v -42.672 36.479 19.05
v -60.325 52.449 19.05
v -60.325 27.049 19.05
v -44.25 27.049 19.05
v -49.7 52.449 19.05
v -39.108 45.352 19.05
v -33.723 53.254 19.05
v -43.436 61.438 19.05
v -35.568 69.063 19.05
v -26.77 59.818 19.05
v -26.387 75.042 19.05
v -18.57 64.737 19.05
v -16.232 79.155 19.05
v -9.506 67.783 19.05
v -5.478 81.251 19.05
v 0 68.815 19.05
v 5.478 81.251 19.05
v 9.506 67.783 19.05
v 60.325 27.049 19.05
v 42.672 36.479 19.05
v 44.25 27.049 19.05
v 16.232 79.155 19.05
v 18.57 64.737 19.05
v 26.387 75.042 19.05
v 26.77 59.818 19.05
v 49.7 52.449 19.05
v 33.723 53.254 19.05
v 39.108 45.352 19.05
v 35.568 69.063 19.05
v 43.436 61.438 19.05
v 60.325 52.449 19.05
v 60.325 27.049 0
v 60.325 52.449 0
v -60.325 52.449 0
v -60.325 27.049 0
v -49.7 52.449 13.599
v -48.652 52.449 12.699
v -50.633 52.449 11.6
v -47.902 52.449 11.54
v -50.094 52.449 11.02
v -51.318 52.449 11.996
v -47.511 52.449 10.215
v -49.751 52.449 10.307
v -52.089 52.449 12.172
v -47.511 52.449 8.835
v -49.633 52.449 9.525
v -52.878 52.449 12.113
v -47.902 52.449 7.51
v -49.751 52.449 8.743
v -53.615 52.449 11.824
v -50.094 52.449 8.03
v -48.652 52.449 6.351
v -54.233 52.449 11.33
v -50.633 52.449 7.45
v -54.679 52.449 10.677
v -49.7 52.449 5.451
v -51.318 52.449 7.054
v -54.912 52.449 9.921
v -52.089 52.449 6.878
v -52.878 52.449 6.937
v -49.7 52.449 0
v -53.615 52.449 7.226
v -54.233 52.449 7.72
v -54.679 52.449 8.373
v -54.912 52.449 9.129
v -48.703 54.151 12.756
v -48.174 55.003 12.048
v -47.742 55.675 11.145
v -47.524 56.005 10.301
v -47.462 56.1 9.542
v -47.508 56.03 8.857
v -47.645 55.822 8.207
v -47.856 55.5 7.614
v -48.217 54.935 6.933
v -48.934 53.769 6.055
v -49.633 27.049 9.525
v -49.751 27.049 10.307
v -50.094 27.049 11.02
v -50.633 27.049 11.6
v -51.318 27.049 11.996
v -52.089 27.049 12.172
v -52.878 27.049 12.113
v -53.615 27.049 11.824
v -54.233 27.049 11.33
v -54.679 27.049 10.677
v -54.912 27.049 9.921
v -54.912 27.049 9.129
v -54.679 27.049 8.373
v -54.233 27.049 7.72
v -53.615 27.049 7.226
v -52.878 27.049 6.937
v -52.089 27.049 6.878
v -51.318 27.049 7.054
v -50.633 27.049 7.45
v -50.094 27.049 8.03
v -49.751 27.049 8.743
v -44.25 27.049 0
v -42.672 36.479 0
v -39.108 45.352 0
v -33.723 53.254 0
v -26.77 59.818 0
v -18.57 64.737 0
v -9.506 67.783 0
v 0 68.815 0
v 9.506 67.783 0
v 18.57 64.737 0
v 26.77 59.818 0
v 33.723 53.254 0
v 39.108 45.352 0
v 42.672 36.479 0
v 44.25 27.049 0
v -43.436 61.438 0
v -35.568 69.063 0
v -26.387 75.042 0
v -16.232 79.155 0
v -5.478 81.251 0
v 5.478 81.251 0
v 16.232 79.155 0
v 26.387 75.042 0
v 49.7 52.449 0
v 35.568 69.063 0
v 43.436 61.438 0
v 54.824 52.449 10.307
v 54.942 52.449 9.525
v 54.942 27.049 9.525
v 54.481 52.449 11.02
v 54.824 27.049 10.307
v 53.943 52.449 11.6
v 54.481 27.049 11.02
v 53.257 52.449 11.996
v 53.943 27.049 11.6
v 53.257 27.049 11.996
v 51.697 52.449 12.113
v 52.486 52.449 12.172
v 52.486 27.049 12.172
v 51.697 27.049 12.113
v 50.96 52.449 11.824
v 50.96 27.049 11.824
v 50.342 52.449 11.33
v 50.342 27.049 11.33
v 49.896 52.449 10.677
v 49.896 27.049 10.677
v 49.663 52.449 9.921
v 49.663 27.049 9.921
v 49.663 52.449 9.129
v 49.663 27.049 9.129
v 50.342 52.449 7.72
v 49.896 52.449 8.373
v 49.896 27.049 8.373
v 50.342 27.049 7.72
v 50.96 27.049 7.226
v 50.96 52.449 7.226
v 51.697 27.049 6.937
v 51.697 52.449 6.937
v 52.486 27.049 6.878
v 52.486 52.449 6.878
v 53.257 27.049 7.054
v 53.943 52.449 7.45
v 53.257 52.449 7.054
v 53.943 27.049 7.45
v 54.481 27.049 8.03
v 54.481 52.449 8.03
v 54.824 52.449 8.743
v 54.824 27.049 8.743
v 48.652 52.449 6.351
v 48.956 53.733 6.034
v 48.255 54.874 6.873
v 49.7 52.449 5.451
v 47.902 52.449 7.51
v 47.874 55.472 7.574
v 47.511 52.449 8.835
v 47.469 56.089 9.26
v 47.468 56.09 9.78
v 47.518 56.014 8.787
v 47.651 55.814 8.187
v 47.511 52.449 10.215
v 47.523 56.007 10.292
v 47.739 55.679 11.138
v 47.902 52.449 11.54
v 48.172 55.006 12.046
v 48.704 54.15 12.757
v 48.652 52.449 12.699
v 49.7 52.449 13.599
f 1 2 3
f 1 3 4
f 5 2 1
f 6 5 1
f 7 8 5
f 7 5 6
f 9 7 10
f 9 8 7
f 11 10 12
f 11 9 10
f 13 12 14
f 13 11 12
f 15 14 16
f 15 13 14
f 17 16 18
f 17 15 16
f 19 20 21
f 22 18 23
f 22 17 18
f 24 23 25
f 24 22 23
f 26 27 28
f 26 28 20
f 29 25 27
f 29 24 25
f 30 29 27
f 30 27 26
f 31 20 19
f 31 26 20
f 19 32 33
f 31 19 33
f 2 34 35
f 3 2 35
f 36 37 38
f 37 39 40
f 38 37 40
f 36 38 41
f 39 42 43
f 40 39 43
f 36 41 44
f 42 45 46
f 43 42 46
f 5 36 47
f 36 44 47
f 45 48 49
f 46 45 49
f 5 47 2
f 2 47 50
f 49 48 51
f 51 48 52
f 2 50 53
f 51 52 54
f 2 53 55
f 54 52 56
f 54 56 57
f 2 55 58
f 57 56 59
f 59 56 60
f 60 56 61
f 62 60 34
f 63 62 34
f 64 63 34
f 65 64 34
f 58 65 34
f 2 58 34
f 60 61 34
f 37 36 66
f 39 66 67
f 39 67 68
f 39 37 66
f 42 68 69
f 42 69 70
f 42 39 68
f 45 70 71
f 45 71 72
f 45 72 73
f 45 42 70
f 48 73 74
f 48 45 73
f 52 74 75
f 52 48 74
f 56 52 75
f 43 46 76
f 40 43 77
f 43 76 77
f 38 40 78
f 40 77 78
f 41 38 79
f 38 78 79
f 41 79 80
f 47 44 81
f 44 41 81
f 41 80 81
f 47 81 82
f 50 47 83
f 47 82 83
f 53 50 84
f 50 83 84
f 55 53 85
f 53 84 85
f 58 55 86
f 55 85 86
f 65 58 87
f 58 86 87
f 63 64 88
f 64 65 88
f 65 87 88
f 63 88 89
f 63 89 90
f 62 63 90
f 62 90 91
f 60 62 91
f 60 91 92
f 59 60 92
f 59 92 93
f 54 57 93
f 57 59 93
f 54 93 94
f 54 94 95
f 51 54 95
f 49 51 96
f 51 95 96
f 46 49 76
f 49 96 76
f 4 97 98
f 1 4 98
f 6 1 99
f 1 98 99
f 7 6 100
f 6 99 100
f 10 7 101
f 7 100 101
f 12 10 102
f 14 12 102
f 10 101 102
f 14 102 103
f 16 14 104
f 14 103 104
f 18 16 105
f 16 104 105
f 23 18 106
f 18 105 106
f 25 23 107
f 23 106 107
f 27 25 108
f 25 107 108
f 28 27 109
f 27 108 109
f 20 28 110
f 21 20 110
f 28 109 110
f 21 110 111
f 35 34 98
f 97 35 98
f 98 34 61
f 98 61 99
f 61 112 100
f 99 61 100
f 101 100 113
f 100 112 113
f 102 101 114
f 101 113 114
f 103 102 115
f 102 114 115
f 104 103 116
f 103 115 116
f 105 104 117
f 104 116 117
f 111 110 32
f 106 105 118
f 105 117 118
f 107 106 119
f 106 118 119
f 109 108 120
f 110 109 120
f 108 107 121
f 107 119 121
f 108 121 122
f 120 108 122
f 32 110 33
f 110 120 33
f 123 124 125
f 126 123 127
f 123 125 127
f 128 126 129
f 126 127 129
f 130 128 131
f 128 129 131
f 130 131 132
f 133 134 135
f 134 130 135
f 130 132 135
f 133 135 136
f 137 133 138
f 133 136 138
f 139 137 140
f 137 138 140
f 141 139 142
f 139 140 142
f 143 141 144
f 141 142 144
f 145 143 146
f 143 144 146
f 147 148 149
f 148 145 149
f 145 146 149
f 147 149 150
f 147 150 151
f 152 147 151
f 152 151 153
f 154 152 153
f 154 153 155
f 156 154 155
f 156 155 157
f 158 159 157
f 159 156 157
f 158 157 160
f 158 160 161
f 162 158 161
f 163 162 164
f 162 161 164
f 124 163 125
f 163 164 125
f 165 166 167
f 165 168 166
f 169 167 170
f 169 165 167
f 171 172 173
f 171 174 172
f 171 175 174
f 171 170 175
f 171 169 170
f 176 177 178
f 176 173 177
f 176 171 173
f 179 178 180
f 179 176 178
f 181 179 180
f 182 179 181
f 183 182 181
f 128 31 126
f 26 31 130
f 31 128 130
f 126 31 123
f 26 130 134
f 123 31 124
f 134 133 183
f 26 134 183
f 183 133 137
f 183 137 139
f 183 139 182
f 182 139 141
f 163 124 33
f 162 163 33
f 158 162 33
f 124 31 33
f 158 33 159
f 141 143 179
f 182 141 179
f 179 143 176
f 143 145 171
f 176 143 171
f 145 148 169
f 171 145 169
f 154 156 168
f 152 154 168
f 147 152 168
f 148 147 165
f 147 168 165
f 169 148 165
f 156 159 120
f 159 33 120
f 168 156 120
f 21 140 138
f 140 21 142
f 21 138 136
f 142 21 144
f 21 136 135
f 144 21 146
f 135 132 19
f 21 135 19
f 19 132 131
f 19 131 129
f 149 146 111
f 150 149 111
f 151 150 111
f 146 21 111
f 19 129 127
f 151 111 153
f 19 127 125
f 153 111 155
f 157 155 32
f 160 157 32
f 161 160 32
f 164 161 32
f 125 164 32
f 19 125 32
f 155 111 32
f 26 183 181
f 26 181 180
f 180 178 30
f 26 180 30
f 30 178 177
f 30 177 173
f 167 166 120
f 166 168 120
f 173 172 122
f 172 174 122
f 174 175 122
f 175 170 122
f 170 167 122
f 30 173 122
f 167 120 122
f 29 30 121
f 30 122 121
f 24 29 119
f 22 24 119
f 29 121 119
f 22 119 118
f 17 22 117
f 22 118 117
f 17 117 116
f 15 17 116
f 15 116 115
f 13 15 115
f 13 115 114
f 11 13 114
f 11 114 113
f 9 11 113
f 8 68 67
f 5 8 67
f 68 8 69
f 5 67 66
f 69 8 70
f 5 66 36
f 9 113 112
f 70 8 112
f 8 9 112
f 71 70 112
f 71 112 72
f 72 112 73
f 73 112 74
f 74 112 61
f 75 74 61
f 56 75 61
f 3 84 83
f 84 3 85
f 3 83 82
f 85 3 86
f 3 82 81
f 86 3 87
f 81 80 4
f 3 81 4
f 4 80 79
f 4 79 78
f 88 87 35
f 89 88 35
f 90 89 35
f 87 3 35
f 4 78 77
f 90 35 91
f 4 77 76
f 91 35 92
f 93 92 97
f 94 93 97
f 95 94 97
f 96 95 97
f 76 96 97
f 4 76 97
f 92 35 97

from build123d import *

# Parameters (mm, degrees)
F1_DEPTH = 19.05
F2_R     = 2.6543
F3_DEPTH = 54.466987
F4_R     = 4.826
F5_DEPTH = 39.878


with BuildPart() as f1:
    # F0 (on Top) → F1 (new body)
    with BuildSketch(Plane.XY):
        with BuildLine():
            ThreePointArc((-44.250161, 27.048605), (0, 68.814592), (44.250161, 27.048605))
            Line((44.250161, 27.048605), (60.325, 27.048605))
            Line((60.325, 27.048605), (60.325, 52.448605))
            Line((60.325, 52.448605), (49.699983, 52.448605))
            ThreePointArc((49.699983, 52.448605), (0, 81.514592), (-49.699983, 52.448605))
            Line((-49.699983, 52.448605), (-60.325, 52.448605))
            Line((-60.325, 52.448605), (-60.325, 27.048605))
            Line((-60.325, 27.048605), (-44.250161, 27.048605))
        make_face()
    extrude(amount=F1_DEPTH)

    # F2 (on face) → F3 (cut, through all)
    with BuildSketch(Plane.XZ.offset(-27.048605)):
        with Locations((-52.28758, 9.525)):
            Circle(F2_R)
        with Locations((52.287572, 9.525)):
            Circle(F2_R)
    extrude(amount=-F3_DEPTH, mode=Mode.SUBTRACT)

    # F4 (on face) → F5 (cut)
    with BuildSketch(Plane(origin=(0, 52.448605, 0), x_dir=(-1, 0, 0), z_dir=(0, 1, 0))):
        with Locations((-52.287572, 9.525)):
            Circle(F4_R)
        with Locations((52.28758, 9.525)):
            Circle(F4_R)
        with Locations((-52.287572, 79.375)):
            Circle(F4_R)
        with Locations((52.28758, 79.375)):
            Circle(F4_R)
    extrude(amount=F5_DEPTH, mode=Mode.SUBTRACT)


solid = f1.part
